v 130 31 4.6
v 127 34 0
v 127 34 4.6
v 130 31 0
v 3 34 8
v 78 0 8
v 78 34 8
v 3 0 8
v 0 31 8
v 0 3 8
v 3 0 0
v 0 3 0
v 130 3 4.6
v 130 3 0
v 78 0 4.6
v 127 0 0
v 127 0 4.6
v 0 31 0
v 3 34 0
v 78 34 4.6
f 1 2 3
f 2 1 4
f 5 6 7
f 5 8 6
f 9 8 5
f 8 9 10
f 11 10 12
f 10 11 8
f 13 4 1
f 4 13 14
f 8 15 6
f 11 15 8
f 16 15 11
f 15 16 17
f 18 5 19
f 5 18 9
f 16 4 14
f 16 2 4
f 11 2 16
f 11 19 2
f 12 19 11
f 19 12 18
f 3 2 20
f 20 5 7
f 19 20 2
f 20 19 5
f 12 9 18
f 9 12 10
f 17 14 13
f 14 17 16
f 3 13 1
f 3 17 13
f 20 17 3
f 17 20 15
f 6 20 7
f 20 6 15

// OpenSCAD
$fn = 32;

// ----------------------------------------------------------------------
// Stepped bar: endstep, 130 x 34 x 8/4.6 mm
// ----------------------------------------------------------------------

// --- parameters (mm) ---
bar_l = 130;              // bar length, X
bar_w = 34;               // bar width, Y
plate_t = 8;              // thickness of the thick zone, Z
thin_t = 4.6;             // thickness of the thin zone
corner_c = 3;             // corner chamfer of the bar
step_cut = 3.4;           // material removed from the thin zone
step_x = 78;              // step position from the left end
depth_1 = 3.4;            // depth of cut 1 from the top face

profile = [[3, 0], [127, 0], [130, 3], [130, 31], [127, 34], [3, 34], [0, 31], [0, 3]];  // primary outline, 8 points, counter clockwise
void_1 = [[78, -1], [131, -1], [131, 35], [78, 35]];  // thin zone beyond the step, 4 points

// --- the one profile operation ---
difference() {
  linear_extrude(height = plate_t) polygon(points = profile);
  translate([0, 0, plate_t - depth_1])
    linear_extrude(height = depth_1 + 1) polygon(points = void_1);
}
